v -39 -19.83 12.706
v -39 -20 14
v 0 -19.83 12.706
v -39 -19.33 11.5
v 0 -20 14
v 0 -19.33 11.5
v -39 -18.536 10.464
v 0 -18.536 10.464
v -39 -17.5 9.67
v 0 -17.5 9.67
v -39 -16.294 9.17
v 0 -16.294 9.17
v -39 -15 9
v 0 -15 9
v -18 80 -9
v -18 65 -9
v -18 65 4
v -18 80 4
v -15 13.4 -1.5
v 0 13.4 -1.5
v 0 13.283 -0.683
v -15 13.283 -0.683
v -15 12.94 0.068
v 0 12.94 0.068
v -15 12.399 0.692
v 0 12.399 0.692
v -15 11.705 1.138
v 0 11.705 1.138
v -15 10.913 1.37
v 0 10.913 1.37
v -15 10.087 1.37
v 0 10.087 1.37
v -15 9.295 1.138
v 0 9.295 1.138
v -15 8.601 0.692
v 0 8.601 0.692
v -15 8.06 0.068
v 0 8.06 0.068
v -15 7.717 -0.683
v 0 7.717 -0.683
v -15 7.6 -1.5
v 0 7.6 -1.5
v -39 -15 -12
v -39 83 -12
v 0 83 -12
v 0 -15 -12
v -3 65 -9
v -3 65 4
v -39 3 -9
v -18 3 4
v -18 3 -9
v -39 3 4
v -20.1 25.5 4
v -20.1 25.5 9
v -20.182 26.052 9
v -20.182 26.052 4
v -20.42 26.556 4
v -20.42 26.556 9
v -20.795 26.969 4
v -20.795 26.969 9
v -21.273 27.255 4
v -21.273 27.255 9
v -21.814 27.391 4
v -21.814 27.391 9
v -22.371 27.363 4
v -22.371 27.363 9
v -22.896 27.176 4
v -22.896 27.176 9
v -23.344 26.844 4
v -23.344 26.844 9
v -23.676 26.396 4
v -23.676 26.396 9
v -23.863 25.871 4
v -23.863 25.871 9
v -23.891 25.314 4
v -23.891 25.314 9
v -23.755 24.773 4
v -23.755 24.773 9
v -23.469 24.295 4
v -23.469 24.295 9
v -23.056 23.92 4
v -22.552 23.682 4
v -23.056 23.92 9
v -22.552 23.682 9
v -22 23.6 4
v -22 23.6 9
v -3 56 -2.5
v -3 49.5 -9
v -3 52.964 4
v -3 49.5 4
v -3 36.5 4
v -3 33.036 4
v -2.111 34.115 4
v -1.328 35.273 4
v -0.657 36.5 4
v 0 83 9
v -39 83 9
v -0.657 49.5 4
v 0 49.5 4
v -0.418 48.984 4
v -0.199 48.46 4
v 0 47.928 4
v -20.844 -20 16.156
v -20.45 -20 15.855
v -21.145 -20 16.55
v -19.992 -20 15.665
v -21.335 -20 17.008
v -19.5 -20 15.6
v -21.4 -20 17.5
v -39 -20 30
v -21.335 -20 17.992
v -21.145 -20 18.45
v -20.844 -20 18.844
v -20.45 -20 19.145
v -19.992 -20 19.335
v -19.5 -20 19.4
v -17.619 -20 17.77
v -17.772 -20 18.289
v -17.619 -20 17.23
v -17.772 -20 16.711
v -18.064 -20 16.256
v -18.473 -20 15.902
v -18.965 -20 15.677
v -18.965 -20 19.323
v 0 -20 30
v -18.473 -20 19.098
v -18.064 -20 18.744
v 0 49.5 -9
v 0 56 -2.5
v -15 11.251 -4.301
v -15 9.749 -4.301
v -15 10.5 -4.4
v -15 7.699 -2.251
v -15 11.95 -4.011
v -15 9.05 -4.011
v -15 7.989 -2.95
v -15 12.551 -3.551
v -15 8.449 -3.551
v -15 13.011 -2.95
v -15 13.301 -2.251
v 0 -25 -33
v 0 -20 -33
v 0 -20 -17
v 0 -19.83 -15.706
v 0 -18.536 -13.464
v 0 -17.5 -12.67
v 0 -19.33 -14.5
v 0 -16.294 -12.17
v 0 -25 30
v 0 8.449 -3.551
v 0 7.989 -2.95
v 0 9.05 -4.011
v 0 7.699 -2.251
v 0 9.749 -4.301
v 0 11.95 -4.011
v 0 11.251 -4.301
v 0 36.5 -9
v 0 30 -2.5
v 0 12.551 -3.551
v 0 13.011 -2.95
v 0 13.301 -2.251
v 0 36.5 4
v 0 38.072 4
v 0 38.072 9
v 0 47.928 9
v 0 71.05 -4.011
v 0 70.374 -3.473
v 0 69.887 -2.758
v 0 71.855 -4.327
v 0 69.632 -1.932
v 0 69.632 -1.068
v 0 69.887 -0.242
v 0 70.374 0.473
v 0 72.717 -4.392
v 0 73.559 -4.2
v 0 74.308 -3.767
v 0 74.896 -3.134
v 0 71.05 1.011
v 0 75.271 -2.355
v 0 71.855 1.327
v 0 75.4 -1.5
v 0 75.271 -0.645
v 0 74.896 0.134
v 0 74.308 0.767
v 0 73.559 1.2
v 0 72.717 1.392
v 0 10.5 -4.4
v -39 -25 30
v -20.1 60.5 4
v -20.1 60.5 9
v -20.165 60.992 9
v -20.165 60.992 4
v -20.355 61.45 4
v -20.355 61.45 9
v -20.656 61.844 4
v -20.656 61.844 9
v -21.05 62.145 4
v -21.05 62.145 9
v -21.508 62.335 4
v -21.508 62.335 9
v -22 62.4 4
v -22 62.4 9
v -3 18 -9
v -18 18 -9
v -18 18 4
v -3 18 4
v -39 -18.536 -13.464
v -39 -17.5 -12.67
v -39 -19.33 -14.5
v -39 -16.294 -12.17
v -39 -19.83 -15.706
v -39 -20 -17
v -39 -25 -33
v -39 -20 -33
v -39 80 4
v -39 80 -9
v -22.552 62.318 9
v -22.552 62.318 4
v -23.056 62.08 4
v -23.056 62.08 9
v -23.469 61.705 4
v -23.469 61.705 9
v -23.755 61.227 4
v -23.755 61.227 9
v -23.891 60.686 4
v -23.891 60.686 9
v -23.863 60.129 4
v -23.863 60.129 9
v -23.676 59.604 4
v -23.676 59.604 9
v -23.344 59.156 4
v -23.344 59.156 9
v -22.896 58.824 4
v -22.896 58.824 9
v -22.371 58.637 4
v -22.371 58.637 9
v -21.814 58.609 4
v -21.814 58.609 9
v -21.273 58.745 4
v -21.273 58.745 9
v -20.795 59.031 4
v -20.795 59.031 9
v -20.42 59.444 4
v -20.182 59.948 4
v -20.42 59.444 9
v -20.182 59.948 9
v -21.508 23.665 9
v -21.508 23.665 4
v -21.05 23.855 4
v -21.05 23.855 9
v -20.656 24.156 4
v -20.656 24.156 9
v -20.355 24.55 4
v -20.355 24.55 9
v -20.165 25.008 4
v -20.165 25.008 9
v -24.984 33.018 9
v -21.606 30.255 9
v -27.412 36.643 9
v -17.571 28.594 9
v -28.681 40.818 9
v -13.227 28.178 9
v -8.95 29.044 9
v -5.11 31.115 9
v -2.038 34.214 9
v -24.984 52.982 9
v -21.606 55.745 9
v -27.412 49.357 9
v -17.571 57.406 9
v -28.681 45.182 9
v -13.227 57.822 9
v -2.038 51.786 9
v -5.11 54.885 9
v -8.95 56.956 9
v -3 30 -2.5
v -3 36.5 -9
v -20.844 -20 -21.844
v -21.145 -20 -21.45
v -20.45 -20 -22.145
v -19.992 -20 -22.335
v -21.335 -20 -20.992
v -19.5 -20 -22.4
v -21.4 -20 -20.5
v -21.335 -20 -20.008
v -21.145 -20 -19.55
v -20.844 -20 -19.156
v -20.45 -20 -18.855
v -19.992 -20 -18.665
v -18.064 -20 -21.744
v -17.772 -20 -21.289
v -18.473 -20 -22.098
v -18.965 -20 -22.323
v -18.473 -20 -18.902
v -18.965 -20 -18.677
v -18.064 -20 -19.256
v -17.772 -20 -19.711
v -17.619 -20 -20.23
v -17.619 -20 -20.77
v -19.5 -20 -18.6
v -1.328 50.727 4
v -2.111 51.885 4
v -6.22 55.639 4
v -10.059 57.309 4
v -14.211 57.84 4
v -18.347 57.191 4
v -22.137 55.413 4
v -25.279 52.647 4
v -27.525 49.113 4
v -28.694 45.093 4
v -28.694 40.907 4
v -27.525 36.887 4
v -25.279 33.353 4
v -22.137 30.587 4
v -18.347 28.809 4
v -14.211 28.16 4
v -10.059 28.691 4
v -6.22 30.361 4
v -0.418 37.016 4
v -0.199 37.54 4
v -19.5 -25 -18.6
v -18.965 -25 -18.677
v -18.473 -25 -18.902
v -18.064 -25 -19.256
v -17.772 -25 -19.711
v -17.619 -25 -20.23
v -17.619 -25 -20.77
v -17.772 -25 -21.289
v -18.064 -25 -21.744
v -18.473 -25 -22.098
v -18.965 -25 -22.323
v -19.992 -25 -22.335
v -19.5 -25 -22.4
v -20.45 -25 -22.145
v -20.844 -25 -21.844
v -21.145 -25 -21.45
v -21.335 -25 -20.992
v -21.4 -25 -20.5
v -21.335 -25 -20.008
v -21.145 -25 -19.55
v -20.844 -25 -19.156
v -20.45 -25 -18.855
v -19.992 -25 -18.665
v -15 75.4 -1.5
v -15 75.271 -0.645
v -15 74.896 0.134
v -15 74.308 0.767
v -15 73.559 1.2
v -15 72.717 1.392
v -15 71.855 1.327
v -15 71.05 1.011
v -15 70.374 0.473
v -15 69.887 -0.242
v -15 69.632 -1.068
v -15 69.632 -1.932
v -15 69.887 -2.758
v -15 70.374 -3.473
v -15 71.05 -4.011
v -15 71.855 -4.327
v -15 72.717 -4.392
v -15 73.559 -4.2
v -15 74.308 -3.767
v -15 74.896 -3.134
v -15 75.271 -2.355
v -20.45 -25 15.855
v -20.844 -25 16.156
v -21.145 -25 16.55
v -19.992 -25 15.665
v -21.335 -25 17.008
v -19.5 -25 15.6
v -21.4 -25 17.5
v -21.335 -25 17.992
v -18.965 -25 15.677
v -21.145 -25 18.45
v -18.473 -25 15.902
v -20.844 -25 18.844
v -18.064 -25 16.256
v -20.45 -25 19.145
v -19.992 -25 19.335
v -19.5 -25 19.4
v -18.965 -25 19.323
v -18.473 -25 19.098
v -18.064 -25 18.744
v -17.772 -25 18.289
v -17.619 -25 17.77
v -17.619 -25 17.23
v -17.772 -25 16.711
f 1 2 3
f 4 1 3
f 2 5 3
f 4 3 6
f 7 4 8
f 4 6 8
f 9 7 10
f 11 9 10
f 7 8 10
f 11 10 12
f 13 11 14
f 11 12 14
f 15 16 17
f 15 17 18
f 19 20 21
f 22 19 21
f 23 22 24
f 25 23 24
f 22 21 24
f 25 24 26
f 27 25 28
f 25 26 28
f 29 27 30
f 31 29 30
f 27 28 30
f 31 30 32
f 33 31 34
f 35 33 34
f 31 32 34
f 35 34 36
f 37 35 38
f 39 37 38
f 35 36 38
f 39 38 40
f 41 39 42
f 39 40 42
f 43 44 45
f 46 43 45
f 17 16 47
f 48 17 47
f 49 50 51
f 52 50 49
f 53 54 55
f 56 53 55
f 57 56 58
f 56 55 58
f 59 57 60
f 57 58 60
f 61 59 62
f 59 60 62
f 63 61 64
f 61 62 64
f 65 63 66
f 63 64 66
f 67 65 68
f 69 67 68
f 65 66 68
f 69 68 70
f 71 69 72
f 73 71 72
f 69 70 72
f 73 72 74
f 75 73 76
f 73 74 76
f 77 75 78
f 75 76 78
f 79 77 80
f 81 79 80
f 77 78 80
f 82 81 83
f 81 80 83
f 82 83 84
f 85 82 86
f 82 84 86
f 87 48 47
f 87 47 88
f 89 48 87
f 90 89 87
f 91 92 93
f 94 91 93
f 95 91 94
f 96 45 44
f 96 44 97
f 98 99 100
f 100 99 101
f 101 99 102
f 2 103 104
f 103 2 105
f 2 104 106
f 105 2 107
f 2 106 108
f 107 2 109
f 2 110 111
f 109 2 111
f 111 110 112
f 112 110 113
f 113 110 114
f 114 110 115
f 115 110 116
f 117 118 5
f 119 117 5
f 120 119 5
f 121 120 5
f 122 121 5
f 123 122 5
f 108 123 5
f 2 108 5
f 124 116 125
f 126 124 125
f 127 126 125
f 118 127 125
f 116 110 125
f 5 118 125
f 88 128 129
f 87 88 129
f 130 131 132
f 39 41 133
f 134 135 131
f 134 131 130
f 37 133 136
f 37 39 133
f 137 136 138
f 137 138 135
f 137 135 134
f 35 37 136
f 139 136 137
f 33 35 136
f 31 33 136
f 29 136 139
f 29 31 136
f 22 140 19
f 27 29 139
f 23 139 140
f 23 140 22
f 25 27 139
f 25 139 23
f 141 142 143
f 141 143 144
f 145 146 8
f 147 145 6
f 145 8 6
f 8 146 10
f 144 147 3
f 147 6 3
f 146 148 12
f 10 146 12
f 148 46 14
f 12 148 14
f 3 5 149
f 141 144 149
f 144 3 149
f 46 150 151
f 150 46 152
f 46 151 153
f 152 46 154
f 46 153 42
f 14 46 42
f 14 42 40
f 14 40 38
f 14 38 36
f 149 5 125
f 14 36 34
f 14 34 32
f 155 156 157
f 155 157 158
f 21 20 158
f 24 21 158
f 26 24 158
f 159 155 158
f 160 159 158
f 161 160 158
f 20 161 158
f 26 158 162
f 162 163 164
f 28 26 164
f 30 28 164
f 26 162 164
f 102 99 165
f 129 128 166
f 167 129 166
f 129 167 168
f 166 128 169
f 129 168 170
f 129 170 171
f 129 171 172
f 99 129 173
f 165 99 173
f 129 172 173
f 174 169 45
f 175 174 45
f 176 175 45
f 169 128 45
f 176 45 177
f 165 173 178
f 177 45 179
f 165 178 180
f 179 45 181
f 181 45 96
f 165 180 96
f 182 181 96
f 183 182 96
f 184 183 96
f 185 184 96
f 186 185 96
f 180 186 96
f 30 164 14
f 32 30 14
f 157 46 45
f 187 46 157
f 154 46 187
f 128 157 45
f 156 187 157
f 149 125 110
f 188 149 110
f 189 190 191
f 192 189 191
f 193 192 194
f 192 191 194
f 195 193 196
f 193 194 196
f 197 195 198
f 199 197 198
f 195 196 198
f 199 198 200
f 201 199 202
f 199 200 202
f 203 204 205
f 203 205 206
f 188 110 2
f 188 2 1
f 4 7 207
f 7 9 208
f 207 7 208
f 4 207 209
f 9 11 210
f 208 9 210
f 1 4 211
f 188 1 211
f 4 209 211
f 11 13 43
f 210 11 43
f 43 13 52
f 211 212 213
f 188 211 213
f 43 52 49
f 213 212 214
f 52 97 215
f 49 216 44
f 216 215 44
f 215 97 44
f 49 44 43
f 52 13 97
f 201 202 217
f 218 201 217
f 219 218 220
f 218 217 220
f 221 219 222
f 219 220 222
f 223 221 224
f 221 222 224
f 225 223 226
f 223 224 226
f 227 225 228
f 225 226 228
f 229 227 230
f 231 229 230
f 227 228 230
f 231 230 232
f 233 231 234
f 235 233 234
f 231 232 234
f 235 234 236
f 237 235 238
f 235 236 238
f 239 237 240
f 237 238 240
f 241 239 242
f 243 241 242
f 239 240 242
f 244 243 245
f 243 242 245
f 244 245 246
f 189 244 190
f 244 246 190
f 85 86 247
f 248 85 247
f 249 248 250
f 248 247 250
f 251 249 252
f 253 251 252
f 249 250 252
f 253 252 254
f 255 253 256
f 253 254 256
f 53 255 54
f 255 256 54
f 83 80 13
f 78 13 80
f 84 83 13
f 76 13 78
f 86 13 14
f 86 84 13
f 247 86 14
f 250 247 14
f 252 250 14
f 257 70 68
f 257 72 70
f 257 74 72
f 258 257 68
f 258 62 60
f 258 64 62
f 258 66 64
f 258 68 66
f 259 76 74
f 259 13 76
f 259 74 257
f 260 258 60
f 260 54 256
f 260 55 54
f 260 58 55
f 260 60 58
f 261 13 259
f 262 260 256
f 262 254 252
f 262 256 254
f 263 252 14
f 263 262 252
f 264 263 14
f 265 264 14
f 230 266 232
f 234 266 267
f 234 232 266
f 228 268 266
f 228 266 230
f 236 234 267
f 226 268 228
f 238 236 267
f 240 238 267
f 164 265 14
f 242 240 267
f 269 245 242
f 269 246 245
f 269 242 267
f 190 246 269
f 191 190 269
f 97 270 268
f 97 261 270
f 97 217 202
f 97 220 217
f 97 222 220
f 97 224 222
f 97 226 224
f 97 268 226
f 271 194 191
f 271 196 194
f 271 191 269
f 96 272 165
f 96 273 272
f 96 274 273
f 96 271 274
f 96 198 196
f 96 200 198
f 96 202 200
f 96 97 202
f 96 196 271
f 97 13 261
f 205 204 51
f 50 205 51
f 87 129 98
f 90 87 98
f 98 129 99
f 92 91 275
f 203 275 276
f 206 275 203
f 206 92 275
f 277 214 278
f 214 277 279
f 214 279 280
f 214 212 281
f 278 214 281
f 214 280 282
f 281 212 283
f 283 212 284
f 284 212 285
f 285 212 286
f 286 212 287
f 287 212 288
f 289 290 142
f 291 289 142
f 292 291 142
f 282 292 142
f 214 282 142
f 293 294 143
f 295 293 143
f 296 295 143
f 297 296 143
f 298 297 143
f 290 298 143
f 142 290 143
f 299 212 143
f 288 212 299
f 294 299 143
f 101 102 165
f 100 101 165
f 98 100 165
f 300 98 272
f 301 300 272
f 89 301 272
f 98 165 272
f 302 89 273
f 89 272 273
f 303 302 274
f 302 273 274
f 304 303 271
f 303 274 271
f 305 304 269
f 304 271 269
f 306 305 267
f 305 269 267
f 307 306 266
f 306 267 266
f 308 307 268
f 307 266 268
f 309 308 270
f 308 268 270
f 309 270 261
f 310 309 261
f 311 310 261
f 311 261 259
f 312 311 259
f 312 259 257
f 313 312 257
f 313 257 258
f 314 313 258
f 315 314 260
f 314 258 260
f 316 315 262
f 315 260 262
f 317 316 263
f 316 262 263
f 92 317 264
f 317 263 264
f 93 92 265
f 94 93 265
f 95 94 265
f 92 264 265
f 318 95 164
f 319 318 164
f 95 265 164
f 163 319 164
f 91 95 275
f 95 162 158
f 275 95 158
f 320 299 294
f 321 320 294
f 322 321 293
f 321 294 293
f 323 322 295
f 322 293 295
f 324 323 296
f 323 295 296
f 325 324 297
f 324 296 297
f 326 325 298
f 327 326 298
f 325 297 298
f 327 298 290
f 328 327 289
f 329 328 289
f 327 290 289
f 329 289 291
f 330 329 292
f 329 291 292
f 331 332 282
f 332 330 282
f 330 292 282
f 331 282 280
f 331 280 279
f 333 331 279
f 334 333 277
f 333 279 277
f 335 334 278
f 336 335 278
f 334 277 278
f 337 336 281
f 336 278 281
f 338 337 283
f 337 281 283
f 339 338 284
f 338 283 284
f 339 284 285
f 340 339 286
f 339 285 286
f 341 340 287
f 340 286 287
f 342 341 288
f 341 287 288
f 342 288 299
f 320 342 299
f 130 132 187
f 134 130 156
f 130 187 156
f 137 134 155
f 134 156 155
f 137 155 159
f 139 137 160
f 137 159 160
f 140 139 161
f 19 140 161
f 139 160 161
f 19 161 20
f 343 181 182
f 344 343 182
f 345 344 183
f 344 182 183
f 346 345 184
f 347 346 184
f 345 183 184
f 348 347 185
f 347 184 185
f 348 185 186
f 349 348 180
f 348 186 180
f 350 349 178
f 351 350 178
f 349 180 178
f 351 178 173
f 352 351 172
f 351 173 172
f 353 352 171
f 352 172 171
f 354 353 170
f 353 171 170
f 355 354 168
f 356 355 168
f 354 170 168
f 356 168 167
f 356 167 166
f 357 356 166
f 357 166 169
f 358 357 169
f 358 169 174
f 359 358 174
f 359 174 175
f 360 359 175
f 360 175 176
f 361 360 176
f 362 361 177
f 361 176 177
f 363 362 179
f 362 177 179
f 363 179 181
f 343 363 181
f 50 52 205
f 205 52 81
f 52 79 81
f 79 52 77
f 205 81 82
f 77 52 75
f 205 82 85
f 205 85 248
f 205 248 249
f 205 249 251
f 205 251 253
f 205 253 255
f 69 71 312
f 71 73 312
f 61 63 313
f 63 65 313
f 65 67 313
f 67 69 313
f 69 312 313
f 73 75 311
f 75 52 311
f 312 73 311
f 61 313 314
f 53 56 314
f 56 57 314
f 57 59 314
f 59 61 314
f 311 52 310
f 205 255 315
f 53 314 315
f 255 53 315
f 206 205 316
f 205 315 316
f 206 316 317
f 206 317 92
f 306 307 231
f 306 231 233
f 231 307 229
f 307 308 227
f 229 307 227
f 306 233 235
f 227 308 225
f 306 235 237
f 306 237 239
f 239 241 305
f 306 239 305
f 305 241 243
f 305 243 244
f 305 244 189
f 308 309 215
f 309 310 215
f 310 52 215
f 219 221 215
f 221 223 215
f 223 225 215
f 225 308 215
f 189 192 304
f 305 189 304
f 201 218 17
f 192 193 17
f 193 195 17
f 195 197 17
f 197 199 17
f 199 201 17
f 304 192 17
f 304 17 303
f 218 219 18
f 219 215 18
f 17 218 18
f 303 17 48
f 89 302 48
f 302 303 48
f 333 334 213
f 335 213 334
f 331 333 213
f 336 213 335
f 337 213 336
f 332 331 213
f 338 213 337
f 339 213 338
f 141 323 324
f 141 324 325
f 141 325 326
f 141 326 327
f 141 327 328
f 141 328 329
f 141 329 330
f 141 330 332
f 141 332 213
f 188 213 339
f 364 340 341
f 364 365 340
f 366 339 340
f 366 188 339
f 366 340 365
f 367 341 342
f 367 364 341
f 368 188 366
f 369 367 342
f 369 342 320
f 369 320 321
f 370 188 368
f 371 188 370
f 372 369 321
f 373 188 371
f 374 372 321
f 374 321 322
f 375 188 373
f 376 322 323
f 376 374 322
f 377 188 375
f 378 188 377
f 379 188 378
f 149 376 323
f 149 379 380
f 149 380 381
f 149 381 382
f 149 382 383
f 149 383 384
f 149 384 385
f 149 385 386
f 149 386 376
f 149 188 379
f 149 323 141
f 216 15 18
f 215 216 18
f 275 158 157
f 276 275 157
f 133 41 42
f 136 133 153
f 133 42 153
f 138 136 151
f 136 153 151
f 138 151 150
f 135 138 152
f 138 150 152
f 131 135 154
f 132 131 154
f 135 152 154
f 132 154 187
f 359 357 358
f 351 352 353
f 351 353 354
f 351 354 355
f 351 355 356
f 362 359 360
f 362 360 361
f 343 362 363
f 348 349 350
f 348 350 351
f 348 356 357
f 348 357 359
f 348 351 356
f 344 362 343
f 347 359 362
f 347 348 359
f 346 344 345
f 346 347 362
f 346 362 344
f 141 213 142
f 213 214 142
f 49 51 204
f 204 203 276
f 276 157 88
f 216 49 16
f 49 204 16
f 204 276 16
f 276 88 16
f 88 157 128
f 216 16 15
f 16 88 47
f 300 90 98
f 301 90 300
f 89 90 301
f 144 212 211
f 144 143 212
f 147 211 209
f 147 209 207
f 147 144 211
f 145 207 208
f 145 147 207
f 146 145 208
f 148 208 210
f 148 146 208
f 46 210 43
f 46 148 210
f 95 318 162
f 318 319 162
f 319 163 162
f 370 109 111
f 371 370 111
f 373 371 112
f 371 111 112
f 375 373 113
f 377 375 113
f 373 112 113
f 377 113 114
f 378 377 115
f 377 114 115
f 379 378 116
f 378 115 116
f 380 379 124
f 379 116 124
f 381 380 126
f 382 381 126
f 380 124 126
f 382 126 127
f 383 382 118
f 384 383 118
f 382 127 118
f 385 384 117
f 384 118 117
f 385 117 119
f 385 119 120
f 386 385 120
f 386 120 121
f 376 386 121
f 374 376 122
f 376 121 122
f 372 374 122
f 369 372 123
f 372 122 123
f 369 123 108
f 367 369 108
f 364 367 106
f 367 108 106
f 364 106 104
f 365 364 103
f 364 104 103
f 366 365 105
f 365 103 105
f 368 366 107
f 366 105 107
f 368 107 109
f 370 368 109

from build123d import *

# Parameters (mm, degrees)
F1_DEPTH  = 9
F2_W      = 39
F2_H      = 83
F3_DEPTH  = 5
F6_DEPTH  = 18
F7_W      = 18
F7_H      = 18
F8_DEPTH  = 18
F10_DEPTH = 3
F12_DEPTH = 5
F13_R     = 2.9
F14_DEPTH = 15
F15_W     = 3
F15_H     = 13
F16_DEPTH = 21
F17_DEPTH = 5
F18_W     = 39
F18_H     = 21
F19_DEPTH = 20
F21_DEPTH = 3
F22_R     = 5
F24_DEPTH = 25
F26_R     = 3.6982006044
F26_R_2   = 2.7022216625
F26_R_3   = 3.2521132856
F26_R_4   = 2.4365005618
F27_DEPTH = 3
F29_DEPTH = 25
F30_DEPTH = 2


# Not quite as in the source:
# - a pattern or mirror of a feature is missing from the dataset's text; its kind, count and spacing are read off the source's solid


with BuildPart() as f1:
    # F0 (on Top) → F1 (new body, symmetric)
    with BuildSketch(Plane.XY):
        Polygon((0, 0), (0, 83), (-3, 83), (-3, 3), (-39, 3), (-39, 0), align=None)
    extrude(amount=F1_DEPTH, both=True)

    # F2 (on face) → F3 (join)
    with BuildSketch(Plane.XY.offset(9)):
        with Locations((-19.5, 41.5)):
            Rectangle(F2_W, F2_H)
    extrude(amount=-F3_DEPTH)

    # F5 (on face) → F6 (join)
    with BuildSketch(Plane(origin=(0, 83, 0), x_dir=(-1, 0, 0), z_dir=(0, 1, 0))):
        Polygon((18, 9), (0, 9), (0, -9), (3, -9), (3, 4), (18, 4), align=None)
    extrude(amount=-F6_DEPTH)

    # F7 (on face) → F8 (join)
    with BuildSketch(Plane(origin=(0, 0, -9), x_dir=(1, 0, 0), z_dir=(0, 0, -1))):
        with Locations((-9, -9)):
            Rectangle(F7_W, F7_H)
    f8 = extrude(amount=-F8_DEPTH)

    # F8_copies: F8 across plane
    add(f8.mirror(Plane.ZX.offset(41.5)))

    # F9 (on face) → F10 (join)
    with BuildSketch(Plane(origin=(0, 0, -9), x_dir=(1, 0, 0), z_dir=(0, 0, -1))):
        Polygon((-22, -83), (0, -83), (0, 0), (-39, 0), (-39, -83), align=None)
    extrude(amount=F10_DEPTH)

    # F11 (on face) → F12 (cut, through all)
    with BuildSketch(Plane.XY.offset(9)):
        with BuildLine():
            Line((0, 38.0723795157), (0, 47.9276204843))
            ThreePointArc((0, 47.9276204843), (-28.8418814049, 43), (0, 38.0723795157))
        make_face()
    extrude(amount=-F12_DEPTH, mode=Mode.SUBTRACT)

    # F13 (on face) → F14 (cut)
    with BuildSketch(Plane.YZ):
        with BuildLine():
            Line((10.5, -1.5), (7.6, -1.5))
            ThreePointArc((7.6, -1.5), (8.4493903346, -3.5506096654), (10.5, -4.4))
            Line((10.5, -4.4), (10.5, -1.5))
        make_face()
        with BuildLine():
            ThreePointArc((13.4, -1.5), (10.5, 1.4), (7.6, -1.5))
            Line((7.6, -1.5), (10.5, -1.5))
            Line((10.5, -1.5), (10.5, -4.4))
            ThreePointArc((10.5, -4.4), (12.5506096654, -3.5506096654), (13.4, -1.5))
        make_face()
        Polygon((30, -2.5), (36.5, -9), (36.5, 4), align=None)
        Polygon((36.5, 4), (36.5, -9), (49.5, -9), (49.5, 4), (47.9276204843, 4), (38.0723795157, 4), align=None)
        Polygon((49.5, 4), (49.5, -9), (56, -2.5), align=None)
        with Locations((72.5, -1.5)):
            Circle(F13_R)
    extrude(amount=-F14_DEPTH, mode=Mode.SUBTRACT)

    # F15 (on face) → F16 (join, through all)
    with BuildSketch(Plane(origin=(-18, 0, 0), x_dir=(0, -1, 0), z_dir=(-1, 0, 0))):
        with Locations((-81.5, -2.5)):
            Rectangle(F15_W, F15_H)
    extrude(amount=F16_DEPTH)

    # F4 (on face) → F17 (cut, through all)
    with BuildSketch(Plane.XY.offset(9)):
        with BuildLine():
            ThreePointArc((-22, 62.4), (-23.3435028843, 59.1564971157), (-20.1, 60.5))
            ThreePointArc((-20.1, 60.5), (-20.6564971157, 61.8435028843), (-22, 62.4))
        make_face()
        with BuildLine():
            ThreePointArc((-22, 23.6), (-20.6564971157, 24.1564971157), (-20.1, 25.5))
            ThreePointArc((-20.1, 25.5), (-23.3435028843, 26.8435028843), (-22, 23.6))
        make_face()
    extrude(amount=-F17_DEPTH, mode=Mode.SUBTRACT)

    # F18 (on face) → F19 (join)
    with BuildSketch(Plane.XZ):
        with Locations((-19.5, -1.5)):
            Rectangle(F18_W, F18_H)
    extrude(amount=F19_DEPTH)

    # F20 (on face) → F21 (join)
    with BuildSketch(Plane.XZ.offset(20)):
        Polygon((0, 30), (-39, 30), (-39, 9), (-39, -12), (-39, -33), (0, -33), (0, -12), (0, 9), align=None)
    extrude(amount=F21_DEPTH)

    # F22
    f22_edges = [f1.edges().sort_by_distance(p)[0] for p in [
        (-19.5, -20, -12),
        (-19.5, -20, 9),
    ]]
    fillet(f22_edges, radius=F22_R)

    # F23 (on face) → F24 (cut)
    with BuildSketch(Plane.XZ.offset(23)):
        with BuildLine():
            Line((-32, 21.1), (-32, 23))
            Line((-32, 23), (-30.1, 23))
            ThreePointArc((-30.1, 23), (-33.3435028843, 24.3435028843), (-32, 21.1))
        make_face()
        with BuildLine():
            Line((-30.1, 23), (-32, 23))
            Line((-32, 23), (-32, 21.1))
            ThreePointArc((-32, 21.1), (-30.6564971157, 21.6564971157), (-30.1, 23))
        make_face()
        with BuildLine():
            ThreePointArc((-5.1, 23), (-7, 24.9), (-8.9, 23))
            Line((-8.9, 23), (-7, 23))
            Line((-7, 23), (-7, 21.1))
            ThreePointArc((-7, 21.1), (-5.6564971157, 21.6564971157), (-5.1, 23))
        make_face()
        with BuildLine():
            Line((-7, 23), (-8.9, 23))
            ThreePointArc((-8.9, 23), (-8.3435028843, 21.6564971157), (-7, 21.1))
            Line((-7, 21.1), (-7, 23))
        make_face()
        with BuildLine():
            Line((-32, -26), (-32, -24.1))
            ThreePointArc((-32, -24.1), (-33.3435028843, -27.3435028843), (-30.1, -26))
            Line((-30.1, -26), (-32, -26))
        make_face()
        with BuildLine():
            ThreePointArc((-30.1, -26), (-30.6564971157, -24.6564971157), (-32, -24.1))
            Line((-32, -24.1), (-32, -26))
            Line((-32, -26), (-30.1, -26))
        make_face()
        with BuildLine():
            ThreePointArc((-5.1, -26), (-5.6564971157, -24.6564971157), (-7, -24.1))
            Line((-7, -24.1), (-7, -26))
            Line((-7, -26), (-8.9, -26))
            ThreePointArc((-8.9, -26), (-7, -27.9), (-5.1, -26))
        make_face()
        with BuildLine():
            Line((-7, -26), (-7, -24.1))
            ThreePointArc((-7, -24.1), (-8.3435028843, -24.6564971157), (-8.9, -26))
            Line((-8.9, -26), (-7, -26))
        make_face()
    extrude(amount=-F24_DEPTH, mode=Mode.SUBTRACT)

    # F26 (on face) → F27 (join, through all)
    with BuildSketch(Plane(origin=(0, -20, 0), x_dir=(-1, 0, 0), z_dir=(0, 1, 0))):
        with Locations((32, 23)):
            Circle(F26_R)
        with Locations((7, 23)):
            Circle(F26_R_2)
        with Locations((31.5193422139, -25.7969032973)):
            Circle(F26_R_3)
        with Locations((7.0765195414, -26.2656044215)):
            Circle(F26_R_4)
    extrude(amount=-F27_DEPTH)

    # F28 (on face) → F29 (cut)
    with BuildSketch(Plane(origin=(0, -20, 0), x_dir=(-1, 0, 0), z_dir=(0, 1, 0))):
        with BuildLine():
            ThreePointArc((19.5, 15.6), (20.8435028843, 16.1564971157), (21.4, 17.5))
            ThreePointArc((21.4, 17.5), (20.8435028843, 18.8435028843), (19.5, 19.4))
            Line((19.5, 19.4), (19.5, 17.5))
            Line((19.5, 17.5), (19.5, 15.6))
        make_face()
        with BuildLine():
            ThreePointArc((21.4, -20.5), (20.8435028843, -19.1564971157), (19.5, -18.6))
            Line((19.5, -18.6), (19.5, -20.5))
            Line((19.5, -20.5), (19.5, -22.4))
            ThreePointArc((19.5, -22.4), (20.8435028843, -21.8435028843), (21.4, -20.5))
        make_face()
        with BuildLine():
            Line((19.5, -20.5), (19.5, -18.6))
            ThreePointArc((19.5, -18.6), (17.6, -20.5), (19.5, -22.4))
            Line((19.5, -22.4), (19.5, -20.5))
        make_face()
        with BuildLine():
            Line((19.5, 17.5), (19.5, 19.4))
            ThreePointArc((19.5, 19.4), (17.6, 17.5), (19.5, 15.6))
            Line((19.5, 15.6), (19.5, 17.5))
        make_face()
    extrude(amount=-F29_DEPTH, mode=Mode.SUBTRACT)

    # F30 (add): a face of the model
    f30_faces = [f1.faces().sort_by_distance(p)[0] for p in [
        (-19.5, -23, -1.5),
    ]]
    extrude(f30_faces, amount=F30_DEPTH)


solid = f1.part
